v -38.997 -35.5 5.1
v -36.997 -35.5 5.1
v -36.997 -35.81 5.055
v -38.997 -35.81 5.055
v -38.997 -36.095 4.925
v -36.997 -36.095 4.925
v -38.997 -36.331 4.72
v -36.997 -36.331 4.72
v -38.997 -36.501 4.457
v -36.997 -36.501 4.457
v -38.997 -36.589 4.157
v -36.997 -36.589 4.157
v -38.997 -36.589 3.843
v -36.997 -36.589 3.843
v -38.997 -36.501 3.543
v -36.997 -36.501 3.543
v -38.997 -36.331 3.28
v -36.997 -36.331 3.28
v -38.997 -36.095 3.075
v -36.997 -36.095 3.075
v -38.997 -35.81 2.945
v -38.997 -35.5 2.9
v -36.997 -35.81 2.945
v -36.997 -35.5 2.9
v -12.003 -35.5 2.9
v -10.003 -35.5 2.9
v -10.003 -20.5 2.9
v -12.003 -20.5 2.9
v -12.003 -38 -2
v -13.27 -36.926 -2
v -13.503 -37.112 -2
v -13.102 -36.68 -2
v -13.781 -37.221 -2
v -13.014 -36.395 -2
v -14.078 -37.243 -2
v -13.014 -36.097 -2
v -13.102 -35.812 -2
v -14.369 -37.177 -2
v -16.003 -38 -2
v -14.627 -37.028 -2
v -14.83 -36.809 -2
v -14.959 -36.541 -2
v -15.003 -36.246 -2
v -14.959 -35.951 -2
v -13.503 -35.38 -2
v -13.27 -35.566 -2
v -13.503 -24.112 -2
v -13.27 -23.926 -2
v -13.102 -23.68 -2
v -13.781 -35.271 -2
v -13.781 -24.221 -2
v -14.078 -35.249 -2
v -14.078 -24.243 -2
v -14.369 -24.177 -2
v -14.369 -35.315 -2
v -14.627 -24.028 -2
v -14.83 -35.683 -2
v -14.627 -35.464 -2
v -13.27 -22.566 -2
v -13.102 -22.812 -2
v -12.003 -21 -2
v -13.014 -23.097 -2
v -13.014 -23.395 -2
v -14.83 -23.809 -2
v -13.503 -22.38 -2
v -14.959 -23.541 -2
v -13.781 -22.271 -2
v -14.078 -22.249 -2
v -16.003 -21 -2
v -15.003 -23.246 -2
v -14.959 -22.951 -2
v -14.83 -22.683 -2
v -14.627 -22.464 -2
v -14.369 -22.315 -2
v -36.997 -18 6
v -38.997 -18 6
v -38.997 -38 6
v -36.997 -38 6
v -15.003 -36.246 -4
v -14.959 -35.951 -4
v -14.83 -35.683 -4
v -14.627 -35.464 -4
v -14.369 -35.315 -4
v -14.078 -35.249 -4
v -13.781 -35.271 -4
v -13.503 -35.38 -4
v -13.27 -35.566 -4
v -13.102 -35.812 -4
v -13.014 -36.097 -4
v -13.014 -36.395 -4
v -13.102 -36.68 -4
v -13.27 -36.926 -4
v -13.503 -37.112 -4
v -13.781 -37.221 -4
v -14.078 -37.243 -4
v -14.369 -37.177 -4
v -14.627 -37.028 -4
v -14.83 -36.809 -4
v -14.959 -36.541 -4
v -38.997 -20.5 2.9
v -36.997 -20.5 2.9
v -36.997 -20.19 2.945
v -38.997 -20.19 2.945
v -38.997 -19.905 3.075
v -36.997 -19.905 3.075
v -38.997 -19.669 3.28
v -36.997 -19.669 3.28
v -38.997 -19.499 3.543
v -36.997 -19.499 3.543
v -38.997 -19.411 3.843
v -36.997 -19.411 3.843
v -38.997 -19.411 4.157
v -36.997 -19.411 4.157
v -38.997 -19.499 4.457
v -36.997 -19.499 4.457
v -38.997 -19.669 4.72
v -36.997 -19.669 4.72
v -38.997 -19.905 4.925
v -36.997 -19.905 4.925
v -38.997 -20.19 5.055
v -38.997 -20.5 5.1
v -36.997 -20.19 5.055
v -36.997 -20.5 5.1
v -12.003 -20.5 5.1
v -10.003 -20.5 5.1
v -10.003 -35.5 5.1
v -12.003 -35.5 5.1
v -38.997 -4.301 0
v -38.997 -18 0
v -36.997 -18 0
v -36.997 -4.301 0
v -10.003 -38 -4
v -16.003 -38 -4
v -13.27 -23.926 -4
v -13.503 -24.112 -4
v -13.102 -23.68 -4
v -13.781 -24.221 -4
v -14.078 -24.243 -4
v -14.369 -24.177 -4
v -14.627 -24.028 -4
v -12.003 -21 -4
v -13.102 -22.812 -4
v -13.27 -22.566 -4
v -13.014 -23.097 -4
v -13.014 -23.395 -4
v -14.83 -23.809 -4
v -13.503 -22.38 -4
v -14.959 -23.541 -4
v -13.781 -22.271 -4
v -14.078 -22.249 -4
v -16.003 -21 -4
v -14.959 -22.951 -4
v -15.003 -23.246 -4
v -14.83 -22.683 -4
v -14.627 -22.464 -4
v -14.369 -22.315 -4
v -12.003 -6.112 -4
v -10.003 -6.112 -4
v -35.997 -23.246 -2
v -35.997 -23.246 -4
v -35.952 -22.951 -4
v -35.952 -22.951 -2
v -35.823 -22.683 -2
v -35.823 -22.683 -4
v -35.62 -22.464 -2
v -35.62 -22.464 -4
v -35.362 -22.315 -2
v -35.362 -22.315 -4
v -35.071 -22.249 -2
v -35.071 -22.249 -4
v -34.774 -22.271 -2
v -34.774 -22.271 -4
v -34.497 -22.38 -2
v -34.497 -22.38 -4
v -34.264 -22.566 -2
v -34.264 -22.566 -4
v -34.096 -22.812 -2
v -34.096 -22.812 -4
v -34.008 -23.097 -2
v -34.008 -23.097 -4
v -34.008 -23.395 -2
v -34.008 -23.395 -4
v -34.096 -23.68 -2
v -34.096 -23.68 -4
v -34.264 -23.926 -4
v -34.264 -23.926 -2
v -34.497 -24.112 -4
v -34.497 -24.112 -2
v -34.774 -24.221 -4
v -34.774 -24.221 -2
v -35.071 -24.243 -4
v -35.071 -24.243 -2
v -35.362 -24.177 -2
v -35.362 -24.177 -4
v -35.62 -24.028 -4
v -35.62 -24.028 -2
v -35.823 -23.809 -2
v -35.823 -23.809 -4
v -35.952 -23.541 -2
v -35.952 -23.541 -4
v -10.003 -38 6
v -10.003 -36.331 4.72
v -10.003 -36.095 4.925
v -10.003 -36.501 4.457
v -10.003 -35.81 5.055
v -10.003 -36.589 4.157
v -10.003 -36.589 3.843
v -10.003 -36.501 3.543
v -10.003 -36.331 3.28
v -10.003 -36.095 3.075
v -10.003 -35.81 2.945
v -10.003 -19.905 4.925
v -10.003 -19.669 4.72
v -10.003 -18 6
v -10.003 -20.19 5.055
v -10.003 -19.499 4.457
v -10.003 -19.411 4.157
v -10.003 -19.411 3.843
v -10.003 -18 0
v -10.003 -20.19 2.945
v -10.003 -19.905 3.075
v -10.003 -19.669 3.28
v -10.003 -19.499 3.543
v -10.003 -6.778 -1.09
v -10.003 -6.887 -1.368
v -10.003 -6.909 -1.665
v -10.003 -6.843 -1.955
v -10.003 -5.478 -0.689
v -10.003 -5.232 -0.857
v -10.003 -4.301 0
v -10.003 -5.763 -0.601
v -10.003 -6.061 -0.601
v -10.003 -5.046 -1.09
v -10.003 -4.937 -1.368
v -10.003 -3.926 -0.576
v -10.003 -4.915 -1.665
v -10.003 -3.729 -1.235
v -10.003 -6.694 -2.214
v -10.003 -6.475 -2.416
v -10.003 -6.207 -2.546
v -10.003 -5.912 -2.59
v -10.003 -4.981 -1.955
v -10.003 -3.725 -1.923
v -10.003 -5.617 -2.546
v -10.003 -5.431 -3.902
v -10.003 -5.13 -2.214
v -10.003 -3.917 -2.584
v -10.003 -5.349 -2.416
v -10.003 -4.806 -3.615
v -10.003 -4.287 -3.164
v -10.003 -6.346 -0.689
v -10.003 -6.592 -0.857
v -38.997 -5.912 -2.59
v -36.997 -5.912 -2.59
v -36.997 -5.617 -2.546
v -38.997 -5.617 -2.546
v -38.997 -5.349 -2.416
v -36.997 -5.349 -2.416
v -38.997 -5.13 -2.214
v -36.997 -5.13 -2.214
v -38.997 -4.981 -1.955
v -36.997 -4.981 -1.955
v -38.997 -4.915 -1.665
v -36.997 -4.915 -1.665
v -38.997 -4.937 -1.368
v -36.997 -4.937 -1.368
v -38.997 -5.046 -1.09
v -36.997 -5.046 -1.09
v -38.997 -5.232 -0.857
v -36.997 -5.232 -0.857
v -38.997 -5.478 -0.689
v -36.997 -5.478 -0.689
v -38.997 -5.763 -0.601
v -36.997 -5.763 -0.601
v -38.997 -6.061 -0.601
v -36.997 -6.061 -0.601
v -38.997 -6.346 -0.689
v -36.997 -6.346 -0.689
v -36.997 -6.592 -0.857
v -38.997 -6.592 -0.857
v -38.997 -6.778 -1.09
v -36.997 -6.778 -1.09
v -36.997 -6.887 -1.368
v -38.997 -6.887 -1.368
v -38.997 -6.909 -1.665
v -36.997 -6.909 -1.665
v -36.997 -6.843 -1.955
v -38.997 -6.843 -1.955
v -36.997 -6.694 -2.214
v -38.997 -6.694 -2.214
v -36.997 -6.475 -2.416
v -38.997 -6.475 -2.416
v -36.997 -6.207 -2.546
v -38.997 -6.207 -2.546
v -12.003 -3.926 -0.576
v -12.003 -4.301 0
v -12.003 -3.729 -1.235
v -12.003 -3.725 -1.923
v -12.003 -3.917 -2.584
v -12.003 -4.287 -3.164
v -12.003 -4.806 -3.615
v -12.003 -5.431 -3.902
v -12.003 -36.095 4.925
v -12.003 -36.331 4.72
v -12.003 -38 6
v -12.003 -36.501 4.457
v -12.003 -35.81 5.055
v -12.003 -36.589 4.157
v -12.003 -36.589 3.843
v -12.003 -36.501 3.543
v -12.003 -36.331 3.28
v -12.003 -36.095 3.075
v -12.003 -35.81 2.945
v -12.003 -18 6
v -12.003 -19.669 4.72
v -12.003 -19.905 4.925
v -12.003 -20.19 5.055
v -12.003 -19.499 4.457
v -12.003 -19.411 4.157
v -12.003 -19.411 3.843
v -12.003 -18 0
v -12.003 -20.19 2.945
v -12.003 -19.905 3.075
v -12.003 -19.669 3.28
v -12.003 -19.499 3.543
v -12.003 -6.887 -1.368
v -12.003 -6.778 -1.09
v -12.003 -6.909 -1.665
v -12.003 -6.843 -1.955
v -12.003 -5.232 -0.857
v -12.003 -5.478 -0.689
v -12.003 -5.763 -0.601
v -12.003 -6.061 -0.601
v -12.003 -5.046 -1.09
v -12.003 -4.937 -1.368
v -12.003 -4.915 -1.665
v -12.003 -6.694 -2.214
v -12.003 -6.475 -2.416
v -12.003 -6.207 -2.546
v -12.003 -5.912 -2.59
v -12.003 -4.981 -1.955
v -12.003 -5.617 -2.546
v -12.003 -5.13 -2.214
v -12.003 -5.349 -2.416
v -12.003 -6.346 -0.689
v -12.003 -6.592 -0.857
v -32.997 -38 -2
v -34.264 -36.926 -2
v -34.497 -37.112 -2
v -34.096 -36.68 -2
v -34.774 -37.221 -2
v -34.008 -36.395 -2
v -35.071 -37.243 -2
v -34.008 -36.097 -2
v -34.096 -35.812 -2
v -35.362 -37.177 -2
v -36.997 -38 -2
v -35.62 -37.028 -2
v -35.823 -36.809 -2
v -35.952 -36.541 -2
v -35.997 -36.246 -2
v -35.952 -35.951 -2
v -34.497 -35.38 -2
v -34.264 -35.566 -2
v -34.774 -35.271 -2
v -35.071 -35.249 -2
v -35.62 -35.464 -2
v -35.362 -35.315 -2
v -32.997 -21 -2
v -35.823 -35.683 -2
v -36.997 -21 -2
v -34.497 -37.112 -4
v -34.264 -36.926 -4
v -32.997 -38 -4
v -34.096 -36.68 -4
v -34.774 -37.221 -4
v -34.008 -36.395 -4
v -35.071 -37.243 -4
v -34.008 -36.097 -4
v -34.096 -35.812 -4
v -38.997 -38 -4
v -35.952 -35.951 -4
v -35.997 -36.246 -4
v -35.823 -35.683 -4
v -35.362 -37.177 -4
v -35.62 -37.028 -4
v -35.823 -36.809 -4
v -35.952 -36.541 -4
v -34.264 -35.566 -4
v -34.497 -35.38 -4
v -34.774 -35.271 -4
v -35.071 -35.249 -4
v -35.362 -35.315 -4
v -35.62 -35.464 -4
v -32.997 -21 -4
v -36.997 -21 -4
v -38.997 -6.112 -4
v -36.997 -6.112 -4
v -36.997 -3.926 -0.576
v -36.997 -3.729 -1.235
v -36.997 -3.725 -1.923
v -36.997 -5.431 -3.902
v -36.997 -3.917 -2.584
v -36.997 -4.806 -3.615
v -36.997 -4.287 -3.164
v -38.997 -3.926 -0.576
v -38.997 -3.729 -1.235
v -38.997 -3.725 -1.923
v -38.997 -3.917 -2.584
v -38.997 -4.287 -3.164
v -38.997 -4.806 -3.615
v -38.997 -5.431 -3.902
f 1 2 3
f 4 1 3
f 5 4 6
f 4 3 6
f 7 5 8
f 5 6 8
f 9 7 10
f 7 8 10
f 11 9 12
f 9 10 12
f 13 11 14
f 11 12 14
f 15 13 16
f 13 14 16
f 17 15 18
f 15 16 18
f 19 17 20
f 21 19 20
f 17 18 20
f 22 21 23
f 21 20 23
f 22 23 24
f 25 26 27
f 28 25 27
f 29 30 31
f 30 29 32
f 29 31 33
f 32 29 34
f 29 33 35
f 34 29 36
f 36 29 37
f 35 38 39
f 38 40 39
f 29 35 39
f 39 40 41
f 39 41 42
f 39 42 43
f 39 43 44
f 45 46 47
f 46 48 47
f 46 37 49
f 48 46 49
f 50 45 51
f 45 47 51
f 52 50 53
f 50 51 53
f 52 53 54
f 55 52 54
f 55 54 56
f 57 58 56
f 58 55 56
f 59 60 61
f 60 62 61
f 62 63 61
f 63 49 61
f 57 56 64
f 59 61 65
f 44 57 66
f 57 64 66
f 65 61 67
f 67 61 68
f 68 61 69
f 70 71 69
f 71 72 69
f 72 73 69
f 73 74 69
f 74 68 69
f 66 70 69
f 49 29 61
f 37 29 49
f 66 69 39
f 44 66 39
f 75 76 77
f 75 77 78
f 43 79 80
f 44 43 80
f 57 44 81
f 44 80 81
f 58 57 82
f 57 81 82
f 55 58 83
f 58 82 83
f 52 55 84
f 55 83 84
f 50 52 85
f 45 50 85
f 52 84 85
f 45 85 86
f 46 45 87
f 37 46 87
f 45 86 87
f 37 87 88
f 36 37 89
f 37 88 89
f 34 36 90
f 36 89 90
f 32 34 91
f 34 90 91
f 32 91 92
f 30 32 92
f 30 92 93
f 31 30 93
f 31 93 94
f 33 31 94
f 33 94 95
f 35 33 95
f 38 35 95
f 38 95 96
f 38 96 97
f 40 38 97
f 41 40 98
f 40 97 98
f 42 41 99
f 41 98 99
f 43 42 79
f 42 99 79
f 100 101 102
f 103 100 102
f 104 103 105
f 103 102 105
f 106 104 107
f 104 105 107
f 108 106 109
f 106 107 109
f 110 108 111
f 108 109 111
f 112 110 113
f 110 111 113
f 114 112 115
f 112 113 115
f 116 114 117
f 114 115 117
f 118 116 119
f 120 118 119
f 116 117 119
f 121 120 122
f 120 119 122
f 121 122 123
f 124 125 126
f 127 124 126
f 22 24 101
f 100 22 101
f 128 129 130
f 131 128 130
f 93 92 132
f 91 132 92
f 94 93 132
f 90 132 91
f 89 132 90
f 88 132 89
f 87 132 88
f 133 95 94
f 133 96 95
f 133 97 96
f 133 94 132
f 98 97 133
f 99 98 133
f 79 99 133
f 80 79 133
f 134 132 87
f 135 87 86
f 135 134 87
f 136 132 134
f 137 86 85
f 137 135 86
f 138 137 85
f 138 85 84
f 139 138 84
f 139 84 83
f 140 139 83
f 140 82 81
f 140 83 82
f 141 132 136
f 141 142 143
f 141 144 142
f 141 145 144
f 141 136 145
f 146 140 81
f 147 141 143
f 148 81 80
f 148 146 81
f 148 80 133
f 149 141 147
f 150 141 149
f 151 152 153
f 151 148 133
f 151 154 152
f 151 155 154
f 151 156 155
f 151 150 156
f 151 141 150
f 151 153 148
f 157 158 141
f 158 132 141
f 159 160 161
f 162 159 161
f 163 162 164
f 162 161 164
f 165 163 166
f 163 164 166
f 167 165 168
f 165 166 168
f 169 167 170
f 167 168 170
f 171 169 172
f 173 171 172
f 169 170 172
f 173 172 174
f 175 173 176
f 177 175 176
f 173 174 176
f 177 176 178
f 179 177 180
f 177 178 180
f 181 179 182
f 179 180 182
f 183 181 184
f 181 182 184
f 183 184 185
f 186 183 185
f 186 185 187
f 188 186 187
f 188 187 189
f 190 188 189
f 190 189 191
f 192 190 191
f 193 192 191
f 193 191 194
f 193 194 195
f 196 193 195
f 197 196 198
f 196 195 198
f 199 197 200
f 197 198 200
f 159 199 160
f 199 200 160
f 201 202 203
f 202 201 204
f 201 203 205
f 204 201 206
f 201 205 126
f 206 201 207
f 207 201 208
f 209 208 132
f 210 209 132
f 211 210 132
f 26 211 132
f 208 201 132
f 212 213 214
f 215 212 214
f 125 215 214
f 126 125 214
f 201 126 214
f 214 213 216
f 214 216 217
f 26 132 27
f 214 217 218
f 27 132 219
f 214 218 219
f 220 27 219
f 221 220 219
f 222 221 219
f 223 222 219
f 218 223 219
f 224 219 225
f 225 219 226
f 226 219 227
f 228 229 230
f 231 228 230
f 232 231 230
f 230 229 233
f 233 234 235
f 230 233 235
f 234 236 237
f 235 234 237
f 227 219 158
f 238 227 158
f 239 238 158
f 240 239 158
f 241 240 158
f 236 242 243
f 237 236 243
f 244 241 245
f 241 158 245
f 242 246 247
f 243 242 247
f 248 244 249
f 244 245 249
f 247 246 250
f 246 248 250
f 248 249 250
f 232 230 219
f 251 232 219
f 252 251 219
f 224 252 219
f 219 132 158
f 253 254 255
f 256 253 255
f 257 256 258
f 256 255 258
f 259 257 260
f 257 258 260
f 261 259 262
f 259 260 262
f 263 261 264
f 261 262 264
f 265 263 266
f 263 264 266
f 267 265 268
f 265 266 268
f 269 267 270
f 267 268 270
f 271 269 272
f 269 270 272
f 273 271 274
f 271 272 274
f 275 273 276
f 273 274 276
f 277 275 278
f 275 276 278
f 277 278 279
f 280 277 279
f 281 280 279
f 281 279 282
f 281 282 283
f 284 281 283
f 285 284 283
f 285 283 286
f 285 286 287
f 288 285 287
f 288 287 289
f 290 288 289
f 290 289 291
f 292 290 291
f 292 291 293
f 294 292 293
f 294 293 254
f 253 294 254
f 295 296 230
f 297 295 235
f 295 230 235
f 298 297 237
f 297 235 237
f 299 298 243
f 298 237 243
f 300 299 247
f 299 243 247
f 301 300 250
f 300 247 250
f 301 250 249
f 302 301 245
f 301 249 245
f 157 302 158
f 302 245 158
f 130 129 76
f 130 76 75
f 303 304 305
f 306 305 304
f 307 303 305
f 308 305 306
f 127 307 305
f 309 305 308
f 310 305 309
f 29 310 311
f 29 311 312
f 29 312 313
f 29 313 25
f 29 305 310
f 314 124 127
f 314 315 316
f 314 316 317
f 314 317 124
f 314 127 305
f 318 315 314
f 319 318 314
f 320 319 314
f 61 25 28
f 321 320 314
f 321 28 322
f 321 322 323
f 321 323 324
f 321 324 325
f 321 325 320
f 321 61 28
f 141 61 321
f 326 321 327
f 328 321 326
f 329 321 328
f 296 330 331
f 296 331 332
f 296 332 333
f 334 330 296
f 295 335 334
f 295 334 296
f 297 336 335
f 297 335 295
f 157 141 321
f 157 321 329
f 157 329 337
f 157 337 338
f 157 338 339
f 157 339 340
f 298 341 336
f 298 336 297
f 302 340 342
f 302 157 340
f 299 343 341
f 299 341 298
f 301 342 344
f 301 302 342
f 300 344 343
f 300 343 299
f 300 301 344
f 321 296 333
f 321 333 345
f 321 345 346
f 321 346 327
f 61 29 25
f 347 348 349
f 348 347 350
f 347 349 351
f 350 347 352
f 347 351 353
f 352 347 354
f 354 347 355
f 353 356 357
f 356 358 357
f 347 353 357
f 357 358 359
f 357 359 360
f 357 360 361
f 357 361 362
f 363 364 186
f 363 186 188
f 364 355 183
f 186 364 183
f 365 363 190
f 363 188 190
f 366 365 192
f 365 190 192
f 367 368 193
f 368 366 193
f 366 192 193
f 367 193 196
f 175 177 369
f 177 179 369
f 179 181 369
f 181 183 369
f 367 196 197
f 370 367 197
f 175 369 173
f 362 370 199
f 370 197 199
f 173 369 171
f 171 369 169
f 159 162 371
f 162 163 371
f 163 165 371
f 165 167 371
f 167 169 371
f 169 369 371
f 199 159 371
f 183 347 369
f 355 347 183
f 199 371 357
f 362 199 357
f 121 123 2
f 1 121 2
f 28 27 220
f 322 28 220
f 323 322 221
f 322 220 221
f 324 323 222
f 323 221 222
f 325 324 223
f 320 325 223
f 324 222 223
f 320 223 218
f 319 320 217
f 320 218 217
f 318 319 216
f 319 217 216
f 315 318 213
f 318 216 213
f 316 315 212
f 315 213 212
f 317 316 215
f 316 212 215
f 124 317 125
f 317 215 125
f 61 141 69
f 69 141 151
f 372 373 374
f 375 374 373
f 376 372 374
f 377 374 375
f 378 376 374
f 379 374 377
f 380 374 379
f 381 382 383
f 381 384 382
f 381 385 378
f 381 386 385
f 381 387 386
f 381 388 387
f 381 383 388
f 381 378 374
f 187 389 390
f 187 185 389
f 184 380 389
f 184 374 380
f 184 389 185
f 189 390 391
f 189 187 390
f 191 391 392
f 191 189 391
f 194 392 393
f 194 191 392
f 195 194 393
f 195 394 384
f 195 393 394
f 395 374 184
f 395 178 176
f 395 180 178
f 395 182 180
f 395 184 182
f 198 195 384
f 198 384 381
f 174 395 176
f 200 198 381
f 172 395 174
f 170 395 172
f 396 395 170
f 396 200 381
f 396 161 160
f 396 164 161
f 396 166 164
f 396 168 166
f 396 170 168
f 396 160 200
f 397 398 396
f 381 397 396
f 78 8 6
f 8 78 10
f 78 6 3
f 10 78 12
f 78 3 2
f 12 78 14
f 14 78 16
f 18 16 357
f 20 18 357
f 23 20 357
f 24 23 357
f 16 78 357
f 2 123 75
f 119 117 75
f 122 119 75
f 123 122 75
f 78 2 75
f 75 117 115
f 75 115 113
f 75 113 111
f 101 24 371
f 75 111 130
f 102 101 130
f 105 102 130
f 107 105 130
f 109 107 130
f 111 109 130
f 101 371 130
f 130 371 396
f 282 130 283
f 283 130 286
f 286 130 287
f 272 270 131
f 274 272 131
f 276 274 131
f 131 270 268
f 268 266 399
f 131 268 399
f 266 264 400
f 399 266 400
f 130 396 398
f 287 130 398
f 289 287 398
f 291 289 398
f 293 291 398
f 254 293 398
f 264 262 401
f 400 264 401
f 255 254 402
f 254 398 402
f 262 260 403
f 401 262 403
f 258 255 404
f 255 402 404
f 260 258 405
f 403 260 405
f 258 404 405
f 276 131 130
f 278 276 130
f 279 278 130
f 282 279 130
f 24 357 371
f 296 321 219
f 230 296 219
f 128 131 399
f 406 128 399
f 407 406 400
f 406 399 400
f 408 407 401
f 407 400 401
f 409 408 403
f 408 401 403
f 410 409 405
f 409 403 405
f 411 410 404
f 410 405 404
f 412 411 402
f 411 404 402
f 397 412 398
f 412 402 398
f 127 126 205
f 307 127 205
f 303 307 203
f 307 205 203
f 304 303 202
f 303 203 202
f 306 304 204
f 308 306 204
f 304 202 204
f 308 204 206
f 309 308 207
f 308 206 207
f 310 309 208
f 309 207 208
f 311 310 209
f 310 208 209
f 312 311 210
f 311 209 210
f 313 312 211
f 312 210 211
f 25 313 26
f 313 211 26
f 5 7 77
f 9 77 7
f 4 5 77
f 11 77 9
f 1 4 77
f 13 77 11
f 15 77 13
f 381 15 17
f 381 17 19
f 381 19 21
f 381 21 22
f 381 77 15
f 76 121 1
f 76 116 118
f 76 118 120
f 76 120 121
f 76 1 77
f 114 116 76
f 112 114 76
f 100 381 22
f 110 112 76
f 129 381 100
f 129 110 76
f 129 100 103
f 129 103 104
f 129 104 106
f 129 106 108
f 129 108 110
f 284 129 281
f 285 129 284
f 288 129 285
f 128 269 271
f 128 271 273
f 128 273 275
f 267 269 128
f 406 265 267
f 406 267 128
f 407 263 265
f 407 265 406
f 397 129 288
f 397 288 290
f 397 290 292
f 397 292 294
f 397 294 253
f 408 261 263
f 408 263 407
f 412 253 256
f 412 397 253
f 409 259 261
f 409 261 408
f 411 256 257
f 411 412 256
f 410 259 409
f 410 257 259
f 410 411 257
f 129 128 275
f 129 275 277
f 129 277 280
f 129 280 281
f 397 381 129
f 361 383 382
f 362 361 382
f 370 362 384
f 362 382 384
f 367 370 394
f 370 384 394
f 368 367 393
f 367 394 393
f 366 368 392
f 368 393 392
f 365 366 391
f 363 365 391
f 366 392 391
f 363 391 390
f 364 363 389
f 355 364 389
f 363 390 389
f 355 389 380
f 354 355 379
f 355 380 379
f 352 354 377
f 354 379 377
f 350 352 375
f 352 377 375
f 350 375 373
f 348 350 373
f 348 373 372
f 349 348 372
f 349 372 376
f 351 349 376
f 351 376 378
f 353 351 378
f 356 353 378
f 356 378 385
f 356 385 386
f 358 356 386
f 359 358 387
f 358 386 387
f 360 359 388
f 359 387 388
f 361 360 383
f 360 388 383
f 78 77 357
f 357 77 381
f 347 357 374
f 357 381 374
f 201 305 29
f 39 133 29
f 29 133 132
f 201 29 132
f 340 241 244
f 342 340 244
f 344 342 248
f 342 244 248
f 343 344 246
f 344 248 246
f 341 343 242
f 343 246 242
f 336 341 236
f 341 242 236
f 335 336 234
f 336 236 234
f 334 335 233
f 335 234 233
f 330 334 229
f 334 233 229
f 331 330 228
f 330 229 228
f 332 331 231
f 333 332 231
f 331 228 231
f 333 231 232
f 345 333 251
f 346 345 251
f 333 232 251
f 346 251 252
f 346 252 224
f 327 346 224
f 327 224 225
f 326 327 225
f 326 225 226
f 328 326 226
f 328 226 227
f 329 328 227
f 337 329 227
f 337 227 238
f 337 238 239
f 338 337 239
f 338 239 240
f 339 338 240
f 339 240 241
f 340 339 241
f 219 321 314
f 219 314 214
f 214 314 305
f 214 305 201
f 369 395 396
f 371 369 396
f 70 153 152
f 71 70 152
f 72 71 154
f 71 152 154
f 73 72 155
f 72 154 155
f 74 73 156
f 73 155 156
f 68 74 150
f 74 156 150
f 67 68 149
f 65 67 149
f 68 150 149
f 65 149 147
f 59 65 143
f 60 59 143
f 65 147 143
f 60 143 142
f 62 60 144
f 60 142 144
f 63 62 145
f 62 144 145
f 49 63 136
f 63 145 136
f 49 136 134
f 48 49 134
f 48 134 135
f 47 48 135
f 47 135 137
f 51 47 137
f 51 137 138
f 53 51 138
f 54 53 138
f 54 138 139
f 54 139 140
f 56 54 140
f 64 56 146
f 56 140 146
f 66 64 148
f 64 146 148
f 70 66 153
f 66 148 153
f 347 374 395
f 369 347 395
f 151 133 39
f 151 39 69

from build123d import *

# Parameters (mm, degrees)
SKETCH_1_W          = 2
SKETCH_1_H          = 35
EXTRUDE_1_DEPTH     = 4
EXTRUDE_1_2_DEPTH   = 4
SKETCH_2_W          = 4
SKETCH_2_H          = 17
EXTRUDE_2_DEPTH     = 2
SKETCH_3_R          = 1
CUT_EXTRUDE_1_DEPTH = 2
SKETCH_5_W          = 2
SKETCH_5_H          = 20
EXTRUDE_3_DEPTH     = 6
CUT_EXTRUDE_2_DEPTH = 29.99338081
CUT_EXTRUDE_3_DEPTH = 29.99338081
SKETCH_8_R          = 1
CUT_EXTRUDE_4_DEPTH = 29.99338081


with BuildPart() as part:
    # 草图1 → 凸台-拉伸1 (new body)
    with BuildSketch(Plane.XY):
        with Locations((-37.996690405, -20.5)):
            Rectangle(SKETCH_1_W, SKETCH_1_H)
    extrude(amount=-EXTRUDE_1_DEPTH)



with BuildPart() as body_2:
    # 草图1 → Extrude 1 2 (new body)
    with BuildSketch(Plane.XY):
        with Locations((-11.003309595, -20.5)):
            Rectangle(SKETCH_1_W, SKETCH_1_H)
    extrude(amount=-EXTRUDE_1_2_DEPTH)


with BuildPart() as part_1:
    add(part.part)

    add(body_2.part)  # 凸台-拉伸2 merges body 2
    # 草图2 → 凸台-拉伸2 (add)
    with BuildSketch(Plane(origin=(0, 0, -4), x_dir=(-1, 0, 0), z_dir=(0, 0, -1))):
        with Locations((34.996690405, -29.5)):
            Rectangle(SKETCH_2_W, SKETCH_2_H)
        with Locations((14.003309595, -29.5)):
            Rectangle(SKETCH_2_W, SKETCH_2_H)
    extrude(amount=-EXTRUDE_2_DEPTH)

    # 草图3 → 切除-拉伸1 (cut)
    with BuildSketch(Plane(origin=(0, 0, -4), x_dir=(-1, 0, 0), z_dir=(0, 0, -1))):
        with Locations((34.996690405, -36.24616654)):
            Circle(SKETCH_3_R)
        with Locations((34.996690405, -23.24616654)):
            Circle(SKETCH_3_R)
        with Locations((14.003309595, -36.24616654)):
            Circle(SKETCH_3_R)
        with Locations((14.003309595, -23.24616654)):
            Circle(SKETCH_3_R)
    extrude(amount=-CUT_EXTRUDE_1_DEPTH, mode=Mode.SUBTRACT)

    # 草图5 → 凸台-拉伸3 (add)
    with BuildSketch(Plane.XY):
        with Locations((-11.003309595, -28)):
            Rectangle(SKETCH_5_W, SKETCH_5_H)
        with Locations((-37.996690405, -28)):
            Rectangle(SKETCH_5_W, SKETCH_5_H)
    extrude(amount=EXTRUDE_3_DEPTH)

    # 草图6 → 切除-拉伸2 (cut, through all)
    with BuildSketch(Plane(origin=(-10.003309595, 0, 0), x_dir=(0, 0, -1), z_dir=(1, 0, 0))):
        with BuildLine():
            Line((-5.1, -20.5), (-5.1, -35.5))
            ThreePointArc((-5.1, -35.5), (-4, -36.6), (-2.9, -35.5))
            Line((-2.9, -35.5), (-2.9, -20.5))
            ThreePointArc((-2.9, -20.5), (-4, -19.4), (-5.1, -20.5))
        make_face()
    extrude(amount=-CUT_EXTRUDE_2_DEPTH, mode=Mode.SUBTRACT)

    # 草图7 → 切除-拉伸3 (cut, through all)
    with BuildSketch(Plane(origin=(-10.003309595, 0, 0), x_dir=(0, 0, -1), z_dir=(1, 0, 0))):
        with BuildLine():
            Line((0, -3), (0, -4.301364092))
            ThreePointArc((0, -4.301364092), (2.583976205, -3.916756735), (4, -6.112145643))
            Line((4, -6.112145643), (4, -3))
            Line((4, -3), (0, -3))
        make_face()
    extrude(amount=-CUT_EXTRUDE_3_DEPTH, mode=Mode.SUBTRACT)

    # 草图8 → 切除-拉伸4 (cut, through all)
    with BuildSketch(Plane(origin=(-10.003309595, 0, 0), x_dir=(0, 0, -1), z_dir=(1, 0, 0))):
        with Locations((1.590133771, -5.912145643)):
            Circle(SKETCH_8_R)
    extrude(amount=-CUT_EXTRUDE_4_DEPTH, mode=Mode.SUBTRACT)


solid = part_1.part
